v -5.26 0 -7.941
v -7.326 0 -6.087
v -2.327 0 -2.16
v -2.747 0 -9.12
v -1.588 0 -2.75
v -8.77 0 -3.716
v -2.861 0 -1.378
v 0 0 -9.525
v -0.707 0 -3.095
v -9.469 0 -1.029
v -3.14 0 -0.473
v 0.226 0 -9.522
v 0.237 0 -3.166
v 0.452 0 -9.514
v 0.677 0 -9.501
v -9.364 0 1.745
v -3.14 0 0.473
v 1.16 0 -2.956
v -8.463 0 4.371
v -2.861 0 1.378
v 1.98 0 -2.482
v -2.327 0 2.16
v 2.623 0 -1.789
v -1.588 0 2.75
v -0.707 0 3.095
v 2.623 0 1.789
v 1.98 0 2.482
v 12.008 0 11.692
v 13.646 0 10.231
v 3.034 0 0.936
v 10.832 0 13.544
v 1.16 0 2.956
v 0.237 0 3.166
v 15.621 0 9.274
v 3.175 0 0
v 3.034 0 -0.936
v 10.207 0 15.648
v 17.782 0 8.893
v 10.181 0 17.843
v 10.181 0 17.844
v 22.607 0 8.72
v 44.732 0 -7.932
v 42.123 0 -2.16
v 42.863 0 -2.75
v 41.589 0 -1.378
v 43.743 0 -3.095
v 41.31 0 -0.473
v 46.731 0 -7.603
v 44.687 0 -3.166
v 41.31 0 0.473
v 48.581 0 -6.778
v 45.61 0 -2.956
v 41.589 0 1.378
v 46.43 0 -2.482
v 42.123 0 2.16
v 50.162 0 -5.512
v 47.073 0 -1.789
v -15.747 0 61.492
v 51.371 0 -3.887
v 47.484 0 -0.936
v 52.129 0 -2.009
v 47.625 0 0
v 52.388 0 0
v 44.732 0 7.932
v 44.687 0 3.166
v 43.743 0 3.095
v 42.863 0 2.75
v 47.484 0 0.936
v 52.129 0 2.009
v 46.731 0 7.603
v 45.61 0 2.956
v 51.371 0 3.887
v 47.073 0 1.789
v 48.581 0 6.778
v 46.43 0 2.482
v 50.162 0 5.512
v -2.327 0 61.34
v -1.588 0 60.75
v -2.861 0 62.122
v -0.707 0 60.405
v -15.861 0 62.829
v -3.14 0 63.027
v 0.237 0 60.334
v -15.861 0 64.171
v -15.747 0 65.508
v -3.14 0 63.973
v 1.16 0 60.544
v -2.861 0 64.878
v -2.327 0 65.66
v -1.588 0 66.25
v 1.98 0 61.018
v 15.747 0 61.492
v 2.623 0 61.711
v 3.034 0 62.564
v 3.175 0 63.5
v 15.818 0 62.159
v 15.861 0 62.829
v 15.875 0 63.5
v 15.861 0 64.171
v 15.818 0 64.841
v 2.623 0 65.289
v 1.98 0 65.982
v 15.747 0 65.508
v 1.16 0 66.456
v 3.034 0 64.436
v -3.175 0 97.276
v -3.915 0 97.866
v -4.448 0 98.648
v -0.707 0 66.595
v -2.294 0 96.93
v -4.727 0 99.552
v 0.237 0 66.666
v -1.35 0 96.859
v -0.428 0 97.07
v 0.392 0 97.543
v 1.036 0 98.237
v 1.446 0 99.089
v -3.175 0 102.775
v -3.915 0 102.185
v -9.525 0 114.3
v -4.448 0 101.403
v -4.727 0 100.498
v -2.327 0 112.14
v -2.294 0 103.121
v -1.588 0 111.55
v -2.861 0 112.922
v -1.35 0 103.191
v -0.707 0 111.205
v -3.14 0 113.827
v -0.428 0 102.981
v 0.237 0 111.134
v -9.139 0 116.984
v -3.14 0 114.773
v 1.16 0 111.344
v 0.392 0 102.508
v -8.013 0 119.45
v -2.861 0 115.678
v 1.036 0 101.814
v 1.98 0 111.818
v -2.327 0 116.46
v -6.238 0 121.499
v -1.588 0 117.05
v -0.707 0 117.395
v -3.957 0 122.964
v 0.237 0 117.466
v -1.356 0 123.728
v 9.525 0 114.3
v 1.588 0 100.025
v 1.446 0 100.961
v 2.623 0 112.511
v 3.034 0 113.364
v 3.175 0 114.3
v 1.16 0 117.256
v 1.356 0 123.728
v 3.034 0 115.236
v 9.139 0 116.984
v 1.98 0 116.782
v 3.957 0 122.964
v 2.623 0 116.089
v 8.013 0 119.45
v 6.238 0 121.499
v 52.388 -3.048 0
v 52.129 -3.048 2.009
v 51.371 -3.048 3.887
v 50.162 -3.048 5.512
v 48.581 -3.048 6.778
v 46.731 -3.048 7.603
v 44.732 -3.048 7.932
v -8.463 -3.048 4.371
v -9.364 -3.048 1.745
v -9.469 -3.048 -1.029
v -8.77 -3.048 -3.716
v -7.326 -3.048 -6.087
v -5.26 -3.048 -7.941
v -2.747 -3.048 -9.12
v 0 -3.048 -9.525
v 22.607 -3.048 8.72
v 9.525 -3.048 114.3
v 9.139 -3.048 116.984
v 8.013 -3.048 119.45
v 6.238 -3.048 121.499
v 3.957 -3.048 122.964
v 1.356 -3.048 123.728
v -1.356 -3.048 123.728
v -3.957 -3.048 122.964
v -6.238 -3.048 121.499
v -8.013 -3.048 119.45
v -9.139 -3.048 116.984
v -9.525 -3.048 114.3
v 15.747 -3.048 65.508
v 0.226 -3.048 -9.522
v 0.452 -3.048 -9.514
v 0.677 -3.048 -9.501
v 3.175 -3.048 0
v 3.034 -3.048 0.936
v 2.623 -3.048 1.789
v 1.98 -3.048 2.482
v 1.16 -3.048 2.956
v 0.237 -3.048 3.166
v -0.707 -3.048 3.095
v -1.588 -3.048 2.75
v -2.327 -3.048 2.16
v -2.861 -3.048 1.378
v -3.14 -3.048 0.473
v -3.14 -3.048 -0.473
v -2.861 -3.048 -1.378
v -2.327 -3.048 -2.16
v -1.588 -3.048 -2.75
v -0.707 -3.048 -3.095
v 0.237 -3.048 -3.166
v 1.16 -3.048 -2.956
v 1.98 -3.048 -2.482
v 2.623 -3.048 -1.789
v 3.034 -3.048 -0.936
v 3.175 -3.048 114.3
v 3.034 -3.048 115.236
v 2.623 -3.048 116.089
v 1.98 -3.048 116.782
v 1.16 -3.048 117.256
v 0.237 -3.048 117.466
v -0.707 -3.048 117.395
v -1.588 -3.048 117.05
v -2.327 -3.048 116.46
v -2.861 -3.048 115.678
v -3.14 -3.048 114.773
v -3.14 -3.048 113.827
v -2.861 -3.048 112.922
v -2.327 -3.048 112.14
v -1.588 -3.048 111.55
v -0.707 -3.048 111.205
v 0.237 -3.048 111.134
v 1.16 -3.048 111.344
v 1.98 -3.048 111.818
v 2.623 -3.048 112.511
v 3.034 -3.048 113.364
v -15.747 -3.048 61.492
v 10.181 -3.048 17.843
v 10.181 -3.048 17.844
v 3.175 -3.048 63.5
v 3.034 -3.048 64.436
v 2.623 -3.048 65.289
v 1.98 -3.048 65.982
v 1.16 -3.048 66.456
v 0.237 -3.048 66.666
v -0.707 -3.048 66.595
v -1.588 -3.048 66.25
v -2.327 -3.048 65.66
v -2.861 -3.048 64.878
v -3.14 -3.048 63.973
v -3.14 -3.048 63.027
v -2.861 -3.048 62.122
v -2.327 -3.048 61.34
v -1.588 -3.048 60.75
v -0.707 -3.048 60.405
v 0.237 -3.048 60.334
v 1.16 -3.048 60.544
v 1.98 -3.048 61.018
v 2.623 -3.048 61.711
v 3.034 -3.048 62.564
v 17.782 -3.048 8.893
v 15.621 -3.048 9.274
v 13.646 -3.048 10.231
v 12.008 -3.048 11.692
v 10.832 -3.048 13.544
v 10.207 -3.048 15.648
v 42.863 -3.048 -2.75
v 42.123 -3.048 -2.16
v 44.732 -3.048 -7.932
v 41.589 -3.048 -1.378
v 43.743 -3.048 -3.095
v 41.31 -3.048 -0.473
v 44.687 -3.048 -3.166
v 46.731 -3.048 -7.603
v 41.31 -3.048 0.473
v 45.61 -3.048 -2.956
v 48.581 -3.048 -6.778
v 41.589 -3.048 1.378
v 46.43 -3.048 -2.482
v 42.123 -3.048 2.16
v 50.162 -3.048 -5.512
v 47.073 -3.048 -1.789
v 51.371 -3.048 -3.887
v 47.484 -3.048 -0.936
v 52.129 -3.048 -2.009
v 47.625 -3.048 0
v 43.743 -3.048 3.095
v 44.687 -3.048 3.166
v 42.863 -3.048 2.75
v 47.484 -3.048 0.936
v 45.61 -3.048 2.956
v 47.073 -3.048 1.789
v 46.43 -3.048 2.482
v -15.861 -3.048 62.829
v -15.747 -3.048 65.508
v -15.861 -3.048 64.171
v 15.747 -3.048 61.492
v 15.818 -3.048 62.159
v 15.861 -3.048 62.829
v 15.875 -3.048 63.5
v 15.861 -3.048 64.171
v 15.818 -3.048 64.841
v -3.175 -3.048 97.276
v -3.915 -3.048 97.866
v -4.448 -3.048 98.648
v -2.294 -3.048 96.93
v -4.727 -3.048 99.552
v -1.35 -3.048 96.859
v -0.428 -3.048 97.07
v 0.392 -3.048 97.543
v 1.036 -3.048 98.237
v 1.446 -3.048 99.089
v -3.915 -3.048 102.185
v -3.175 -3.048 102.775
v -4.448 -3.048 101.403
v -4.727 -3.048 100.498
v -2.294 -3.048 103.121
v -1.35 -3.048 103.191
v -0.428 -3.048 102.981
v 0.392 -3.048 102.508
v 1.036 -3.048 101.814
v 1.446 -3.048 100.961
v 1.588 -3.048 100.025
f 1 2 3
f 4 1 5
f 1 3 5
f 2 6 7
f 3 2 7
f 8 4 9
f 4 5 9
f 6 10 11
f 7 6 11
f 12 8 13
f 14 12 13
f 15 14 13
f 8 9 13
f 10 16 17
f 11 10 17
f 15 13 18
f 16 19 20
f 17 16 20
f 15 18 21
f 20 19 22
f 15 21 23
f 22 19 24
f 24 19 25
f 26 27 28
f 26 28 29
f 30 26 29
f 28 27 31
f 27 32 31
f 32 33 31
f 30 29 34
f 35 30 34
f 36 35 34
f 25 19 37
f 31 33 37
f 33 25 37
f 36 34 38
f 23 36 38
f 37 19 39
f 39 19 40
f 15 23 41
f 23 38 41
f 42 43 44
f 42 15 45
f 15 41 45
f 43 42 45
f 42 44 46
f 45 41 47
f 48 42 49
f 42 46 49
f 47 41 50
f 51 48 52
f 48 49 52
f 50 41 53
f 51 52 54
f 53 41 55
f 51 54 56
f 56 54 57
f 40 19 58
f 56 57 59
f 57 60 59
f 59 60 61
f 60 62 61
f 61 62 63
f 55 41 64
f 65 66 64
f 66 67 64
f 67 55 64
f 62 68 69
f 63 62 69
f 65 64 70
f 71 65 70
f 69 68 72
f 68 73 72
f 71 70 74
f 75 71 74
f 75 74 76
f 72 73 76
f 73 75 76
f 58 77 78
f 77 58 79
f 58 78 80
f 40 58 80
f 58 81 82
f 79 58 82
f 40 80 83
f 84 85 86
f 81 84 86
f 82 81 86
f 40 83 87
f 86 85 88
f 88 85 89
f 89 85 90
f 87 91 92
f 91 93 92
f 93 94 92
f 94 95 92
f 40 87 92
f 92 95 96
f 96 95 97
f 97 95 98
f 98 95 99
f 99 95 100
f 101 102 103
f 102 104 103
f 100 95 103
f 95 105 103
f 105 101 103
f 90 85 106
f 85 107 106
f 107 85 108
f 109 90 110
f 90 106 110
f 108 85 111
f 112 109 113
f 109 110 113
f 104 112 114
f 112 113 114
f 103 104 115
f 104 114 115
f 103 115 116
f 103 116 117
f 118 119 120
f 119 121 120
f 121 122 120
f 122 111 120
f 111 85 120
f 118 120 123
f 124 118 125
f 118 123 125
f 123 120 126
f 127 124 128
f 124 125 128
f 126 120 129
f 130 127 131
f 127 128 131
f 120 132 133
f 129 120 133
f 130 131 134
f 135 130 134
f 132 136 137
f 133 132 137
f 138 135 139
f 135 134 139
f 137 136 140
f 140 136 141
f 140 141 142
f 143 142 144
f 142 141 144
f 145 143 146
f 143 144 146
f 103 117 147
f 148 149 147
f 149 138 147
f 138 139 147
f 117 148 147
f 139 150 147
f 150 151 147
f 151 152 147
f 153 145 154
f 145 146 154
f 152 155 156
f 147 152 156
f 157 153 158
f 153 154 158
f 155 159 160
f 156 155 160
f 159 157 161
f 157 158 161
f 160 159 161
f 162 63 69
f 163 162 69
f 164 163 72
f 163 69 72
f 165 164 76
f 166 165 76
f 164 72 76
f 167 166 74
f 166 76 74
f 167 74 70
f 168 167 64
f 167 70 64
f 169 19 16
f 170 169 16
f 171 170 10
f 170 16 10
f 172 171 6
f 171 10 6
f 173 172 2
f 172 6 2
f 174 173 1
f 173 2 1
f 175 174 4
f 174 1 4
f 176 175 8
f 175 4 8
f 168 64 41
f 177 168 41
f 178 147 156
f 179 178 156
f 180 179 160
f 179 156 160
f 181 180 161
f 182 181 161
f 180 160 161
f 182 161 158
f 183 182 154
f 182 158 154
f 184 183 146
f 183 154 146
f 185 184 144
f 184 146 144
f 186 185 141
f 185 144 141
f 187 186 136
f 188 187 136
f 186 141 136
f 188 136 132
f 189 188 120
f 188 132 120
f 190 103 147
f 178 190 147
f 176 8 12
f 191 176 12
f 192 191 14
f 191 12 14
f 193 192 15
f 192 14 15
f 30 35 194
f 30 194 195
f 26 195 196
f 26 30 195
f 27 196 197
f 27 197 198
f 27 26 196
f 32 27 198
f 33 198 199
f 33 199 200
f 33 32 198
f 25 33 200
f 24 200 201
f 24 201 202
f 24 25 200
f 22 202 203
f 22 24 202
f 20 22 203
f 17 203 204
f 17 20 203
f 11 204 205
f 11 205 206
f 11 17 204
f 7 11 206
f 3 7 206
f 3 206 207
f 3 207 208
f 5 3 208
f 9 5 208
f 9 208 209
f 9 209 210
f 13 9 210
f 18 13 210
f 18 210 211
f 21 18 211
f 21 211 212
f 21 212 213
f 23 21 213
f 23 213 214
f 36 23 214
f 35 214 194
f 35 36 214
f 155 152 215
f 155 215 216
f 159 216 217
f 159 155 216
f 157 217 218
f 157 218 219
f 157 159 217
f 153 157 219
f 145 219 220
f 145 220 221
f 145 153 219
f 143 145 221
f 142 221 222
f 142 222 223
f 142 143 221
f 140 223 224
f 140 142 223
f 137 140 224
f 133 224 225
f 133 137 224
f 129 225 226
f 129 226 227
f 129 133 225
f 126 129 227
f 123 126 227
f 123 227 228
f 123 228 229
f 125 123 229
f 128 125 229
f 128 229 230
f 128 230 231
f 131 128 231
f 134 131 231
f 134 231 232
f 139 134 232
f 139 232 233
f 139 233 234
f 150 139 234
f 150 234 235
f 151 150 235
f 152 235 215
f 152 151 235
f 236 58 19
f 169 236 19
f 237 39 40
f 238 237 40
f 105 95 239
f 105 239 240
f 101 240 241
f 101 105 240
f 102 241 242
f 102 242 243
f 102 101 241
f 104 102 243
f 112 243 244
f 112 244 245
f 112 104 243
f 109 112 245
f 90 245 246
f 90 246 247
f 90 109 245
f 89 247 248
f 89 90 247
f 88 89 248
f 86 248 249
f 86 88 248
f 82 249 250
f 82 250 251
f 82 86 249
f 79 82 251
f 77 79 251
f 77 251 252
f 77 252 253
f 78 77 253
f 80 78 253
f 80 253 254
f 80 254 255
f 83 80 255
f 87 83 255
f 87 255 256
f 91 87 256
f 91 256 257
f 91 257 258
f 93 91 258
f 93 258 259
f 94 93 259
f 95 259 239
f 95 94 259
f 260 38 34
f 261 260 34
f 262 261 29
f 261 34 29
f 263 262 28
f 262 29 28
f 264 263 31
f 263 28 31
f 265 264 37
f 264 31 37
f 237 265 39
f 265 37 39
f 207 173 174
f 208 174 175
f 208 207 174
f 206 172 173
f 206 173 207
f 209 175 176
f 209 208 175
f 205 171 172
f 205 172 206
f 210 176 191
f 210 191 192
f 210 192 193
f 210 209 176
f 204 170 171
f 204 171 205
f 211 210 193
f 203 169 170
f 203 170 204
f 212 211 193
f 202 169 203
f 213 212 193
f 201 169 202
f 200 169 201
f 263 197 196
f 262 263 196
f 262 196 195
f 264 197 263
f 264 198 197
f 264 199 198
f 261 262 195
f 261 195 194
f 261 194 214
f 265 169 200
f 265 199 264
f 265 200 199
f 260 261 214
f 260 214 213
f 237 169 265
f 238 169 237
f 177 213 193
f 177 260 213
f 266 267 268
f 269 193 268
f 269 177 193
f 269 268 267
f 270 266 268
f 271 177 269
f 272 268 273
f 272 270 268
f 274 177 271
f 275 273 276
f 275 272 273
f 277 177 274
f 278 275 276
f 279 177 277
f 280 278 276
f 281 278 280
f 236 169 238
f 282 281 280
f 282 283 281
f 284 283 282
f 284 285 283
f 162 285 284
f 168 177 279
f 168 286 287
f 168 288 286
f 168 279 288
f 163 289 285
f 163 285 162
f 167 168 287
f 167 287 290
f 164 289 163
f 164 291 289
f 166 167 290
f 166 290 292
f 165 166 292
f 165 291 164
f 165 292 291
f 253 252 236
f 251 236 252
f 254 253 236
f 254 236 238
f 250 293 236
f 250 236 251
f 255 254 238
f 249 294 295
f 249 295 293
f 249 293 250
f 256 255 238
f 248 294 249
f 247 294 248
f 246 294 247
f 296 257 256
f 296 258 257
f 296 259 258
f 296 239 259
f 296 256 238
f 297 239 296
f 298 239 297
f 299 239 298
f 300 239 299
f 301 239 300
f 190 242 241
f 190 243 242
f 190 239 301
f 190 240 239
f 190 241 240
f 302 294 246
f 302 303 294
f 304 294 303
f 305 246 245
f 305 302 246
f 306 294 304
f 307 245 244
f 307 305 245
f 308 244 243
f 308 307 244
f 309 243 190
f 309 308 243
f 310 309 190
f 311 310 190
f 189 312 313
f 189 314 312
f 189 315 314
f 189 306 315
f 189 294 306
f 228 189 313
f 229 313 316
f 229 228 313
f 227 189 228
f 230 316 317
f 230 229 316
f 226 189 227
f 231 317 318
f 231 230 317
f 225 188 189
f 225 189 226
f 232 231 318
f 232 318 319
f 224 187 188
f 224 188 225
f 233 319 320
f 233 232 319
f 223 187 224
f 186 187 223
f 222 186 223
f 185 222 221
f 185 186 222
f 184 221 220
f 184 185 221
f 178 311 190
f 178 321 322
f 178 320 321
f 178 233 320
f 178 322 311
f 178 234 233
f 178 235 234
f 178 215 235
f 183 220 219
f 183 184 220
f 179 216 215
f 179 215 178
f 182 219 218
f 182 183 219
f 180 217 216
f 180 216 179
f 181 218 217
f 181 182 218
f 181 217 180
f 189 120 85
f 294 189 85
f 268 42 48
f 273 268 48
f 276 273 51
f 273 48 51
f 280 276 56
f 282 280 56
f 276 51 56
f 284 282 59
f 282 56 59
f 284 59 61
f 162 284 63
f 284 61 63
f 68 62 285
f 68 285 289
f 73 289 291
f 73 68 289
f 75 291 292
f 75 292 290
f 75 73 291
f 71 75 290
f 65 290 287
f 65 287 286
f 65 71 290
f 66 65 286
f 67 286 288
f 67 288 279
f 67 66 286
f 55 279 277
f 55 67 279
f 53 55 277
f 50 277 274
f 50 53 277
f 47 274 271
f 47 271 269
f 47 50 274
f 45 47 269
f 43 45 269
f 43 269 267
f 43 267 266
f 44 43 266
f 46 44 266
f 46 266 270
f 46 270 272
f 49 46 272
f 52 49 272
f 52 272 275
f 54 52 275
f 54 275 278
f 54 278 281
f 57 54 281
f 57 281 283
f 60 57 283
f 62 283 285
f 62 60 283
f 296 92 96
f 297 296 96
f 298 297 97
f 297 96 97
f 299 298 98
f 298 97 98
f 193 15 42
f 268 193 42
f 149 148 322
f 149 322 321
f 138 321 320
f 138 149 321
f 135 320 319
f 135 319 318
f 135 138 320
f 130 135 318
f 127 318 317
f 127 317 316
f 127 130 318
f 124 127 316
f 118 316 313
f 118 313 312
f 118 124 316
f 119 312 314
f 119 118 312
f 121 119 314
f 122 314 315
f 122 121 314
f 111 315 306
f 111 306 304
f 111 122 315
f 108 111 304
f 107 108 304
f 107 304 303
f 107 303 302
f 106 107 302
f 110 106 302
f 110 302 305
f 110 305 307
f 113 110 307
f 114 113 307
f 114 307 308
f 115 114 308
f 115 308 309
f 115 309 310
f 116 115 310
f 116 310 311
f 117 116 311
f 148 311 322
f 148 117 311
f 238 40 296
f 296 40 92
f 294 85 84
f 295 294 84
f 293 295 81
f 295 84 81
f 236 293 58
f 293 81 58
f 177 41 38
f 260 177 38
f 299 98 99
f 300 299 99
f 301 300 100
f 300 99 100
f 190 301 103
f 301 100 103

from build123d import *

# Parameters (mm, degrees)
F0_R     = 3.175
F1_DEPTH = 3.048


# Not quite as in the source:
# - ends of sketch curves that miss each other by under 0.0002 mm in the source are joined


with BuildPart() as f1:
    # F0 (on Front) → F1 (new body)
    with BuildSketch(Plane.XZ):
        with BuildLine():
            ThreePointArc((-9.525, 114.3), (0, 104.775), (9.525, 114.3))
            ThreePointArc((9.525, 114.3), (0, 123.825), (-9.525, 114.3))
        make_face()
        with Locations((0, 114.3)):
            Circle(F0_R, mode=Mode.SUBTRACT)
        with BuildLine():
            Line((15.7474569047, 65.5082893304), (9.525, 114.3))
            ThreePointArc((9.525, 114.3), (0, 104.775), (-9.525, 114.3))
            Line((-9.525, 114.3), (-15.7474569047, 65.5082893304))
            ThreePointArc((-15.7474569047, 65.5082893304), (0, 79.375), (15.7474569047, 65.5082893304))
        make_face()
        with Locations((-1.5875, 100.0252)):
            Circle(F0_R, mode=Mode.SUBTRACT)
        with BuildLine():
            ThreePointArc((15.875, 63.5), (15.8430821396, 64.5061676396), (15.7474569047, 65.5082893304))
            ThreePointArc((15.7474569047, 65.5082893304), (0, 79.375), (-15.7474569047, 65.5082893304))
            ThreePointArc((-15.7474569047, 65.5082893304), (-15.875, 63.5), (-15.7474569047, 61.4917106696))
            ThreePointArc((-15.7474569047, 61.4917106696), (0, 47.625), (15.7474569047, 61.4917106696))
            ThreePointArc((15.7474569047, 61.4917106696), (15.8430821396, 62.4938323604), (15.875, 63.5))
        make_face()
        with Locations((0, 63.5)):
            Circle(F0_R, mode=Mode.SUBTRACT)
        with BuildLine():
            ThreePointArc((15.7474569047, 61.4917106696), (0, 47.625), (-15.7474569047, 61.4917106696))
            Line((-15.7474569047, 61.4917106696), (-8.4628069595, 4.371100933))
            ThreePointArc((-8.4628069595, 4.371100933), (2.2491541422, 9.2556431783), (9.525, 0))
            ThreePointArc((9.525, 0), (6.9705567315, -6.4912990883), (0.6773435479, -9.500885786))
            Line((0.6773435479, -9.500885786), (44.7324052746, -7.9324746146))
            ThreePointArc((44.7324052746, -7.9324746146), (36.5125, 0), (44.7324052746, 7.9324746146))
            Line((44.7324052746, 7.9324746146), (22.606619146, 8.7201782014))
            Line((22.606619146, 8.7201782014), (17.7823482037, 8.8932352229))
            ThreePointArc((17.7823482037, 8.8932352229), (12.00790709, 11.6916015121), (10.1808634842, 17.8427750365))
            Line((10.1808634842, 17.8427750365), (10.1810293195, 17.844076245))
            Line((10.1810293195, 17.844076245), (15.7474569047, 61.4917106696))
        make_face()
        with BuildLine():
            ThreePointArc((9.525, 0), (2.2491541422, 9.2556431783), (-8.4628069595, 4.371100933))
            ThreePointArc((-8.4628069595, 4.371100933), (-8.1351202015, -4.9543359097), (0, -9.525))
            Line((0, -9.525), (0.6773435479, -9.500885786))
            ThreePointArc((0.6773435479, -9.500885786), (6.9705567315, -6.4912990883), (9.525, 0))
        make_face()
        Circle(F0_R, mode=Mode.SUBTRACT)
        with BuildLine():
            Line((0.6773435479, -9.500885786), (0, -9.525))
            ThreePointArc((0, -9.525), (0.3388863295, -9.5189695375), (0.6773435479, -9.500885786))
        make_face()
        with BuildLine():
            ThreePointArc((44.7324052746, 7.9324746146), (36.5125, 0), (44.7324052746, -7.9324746146))
            ThreePointArc((44.7324052746, -7.9324746146), (50.1616327839, -5.5119104847), (52.3875, 0))
            ThreePointArc((52.3875, 0), (50.1616327839, 5.5119104847), (44.7324052746, 7.9324746146))
        make_face()
        with Locations((44.45, 0)):
            Circle(F0_R, mode=Mode.SUBTRACT)
    extrude(amount=F1_DEPTH)


solid = f1.part
